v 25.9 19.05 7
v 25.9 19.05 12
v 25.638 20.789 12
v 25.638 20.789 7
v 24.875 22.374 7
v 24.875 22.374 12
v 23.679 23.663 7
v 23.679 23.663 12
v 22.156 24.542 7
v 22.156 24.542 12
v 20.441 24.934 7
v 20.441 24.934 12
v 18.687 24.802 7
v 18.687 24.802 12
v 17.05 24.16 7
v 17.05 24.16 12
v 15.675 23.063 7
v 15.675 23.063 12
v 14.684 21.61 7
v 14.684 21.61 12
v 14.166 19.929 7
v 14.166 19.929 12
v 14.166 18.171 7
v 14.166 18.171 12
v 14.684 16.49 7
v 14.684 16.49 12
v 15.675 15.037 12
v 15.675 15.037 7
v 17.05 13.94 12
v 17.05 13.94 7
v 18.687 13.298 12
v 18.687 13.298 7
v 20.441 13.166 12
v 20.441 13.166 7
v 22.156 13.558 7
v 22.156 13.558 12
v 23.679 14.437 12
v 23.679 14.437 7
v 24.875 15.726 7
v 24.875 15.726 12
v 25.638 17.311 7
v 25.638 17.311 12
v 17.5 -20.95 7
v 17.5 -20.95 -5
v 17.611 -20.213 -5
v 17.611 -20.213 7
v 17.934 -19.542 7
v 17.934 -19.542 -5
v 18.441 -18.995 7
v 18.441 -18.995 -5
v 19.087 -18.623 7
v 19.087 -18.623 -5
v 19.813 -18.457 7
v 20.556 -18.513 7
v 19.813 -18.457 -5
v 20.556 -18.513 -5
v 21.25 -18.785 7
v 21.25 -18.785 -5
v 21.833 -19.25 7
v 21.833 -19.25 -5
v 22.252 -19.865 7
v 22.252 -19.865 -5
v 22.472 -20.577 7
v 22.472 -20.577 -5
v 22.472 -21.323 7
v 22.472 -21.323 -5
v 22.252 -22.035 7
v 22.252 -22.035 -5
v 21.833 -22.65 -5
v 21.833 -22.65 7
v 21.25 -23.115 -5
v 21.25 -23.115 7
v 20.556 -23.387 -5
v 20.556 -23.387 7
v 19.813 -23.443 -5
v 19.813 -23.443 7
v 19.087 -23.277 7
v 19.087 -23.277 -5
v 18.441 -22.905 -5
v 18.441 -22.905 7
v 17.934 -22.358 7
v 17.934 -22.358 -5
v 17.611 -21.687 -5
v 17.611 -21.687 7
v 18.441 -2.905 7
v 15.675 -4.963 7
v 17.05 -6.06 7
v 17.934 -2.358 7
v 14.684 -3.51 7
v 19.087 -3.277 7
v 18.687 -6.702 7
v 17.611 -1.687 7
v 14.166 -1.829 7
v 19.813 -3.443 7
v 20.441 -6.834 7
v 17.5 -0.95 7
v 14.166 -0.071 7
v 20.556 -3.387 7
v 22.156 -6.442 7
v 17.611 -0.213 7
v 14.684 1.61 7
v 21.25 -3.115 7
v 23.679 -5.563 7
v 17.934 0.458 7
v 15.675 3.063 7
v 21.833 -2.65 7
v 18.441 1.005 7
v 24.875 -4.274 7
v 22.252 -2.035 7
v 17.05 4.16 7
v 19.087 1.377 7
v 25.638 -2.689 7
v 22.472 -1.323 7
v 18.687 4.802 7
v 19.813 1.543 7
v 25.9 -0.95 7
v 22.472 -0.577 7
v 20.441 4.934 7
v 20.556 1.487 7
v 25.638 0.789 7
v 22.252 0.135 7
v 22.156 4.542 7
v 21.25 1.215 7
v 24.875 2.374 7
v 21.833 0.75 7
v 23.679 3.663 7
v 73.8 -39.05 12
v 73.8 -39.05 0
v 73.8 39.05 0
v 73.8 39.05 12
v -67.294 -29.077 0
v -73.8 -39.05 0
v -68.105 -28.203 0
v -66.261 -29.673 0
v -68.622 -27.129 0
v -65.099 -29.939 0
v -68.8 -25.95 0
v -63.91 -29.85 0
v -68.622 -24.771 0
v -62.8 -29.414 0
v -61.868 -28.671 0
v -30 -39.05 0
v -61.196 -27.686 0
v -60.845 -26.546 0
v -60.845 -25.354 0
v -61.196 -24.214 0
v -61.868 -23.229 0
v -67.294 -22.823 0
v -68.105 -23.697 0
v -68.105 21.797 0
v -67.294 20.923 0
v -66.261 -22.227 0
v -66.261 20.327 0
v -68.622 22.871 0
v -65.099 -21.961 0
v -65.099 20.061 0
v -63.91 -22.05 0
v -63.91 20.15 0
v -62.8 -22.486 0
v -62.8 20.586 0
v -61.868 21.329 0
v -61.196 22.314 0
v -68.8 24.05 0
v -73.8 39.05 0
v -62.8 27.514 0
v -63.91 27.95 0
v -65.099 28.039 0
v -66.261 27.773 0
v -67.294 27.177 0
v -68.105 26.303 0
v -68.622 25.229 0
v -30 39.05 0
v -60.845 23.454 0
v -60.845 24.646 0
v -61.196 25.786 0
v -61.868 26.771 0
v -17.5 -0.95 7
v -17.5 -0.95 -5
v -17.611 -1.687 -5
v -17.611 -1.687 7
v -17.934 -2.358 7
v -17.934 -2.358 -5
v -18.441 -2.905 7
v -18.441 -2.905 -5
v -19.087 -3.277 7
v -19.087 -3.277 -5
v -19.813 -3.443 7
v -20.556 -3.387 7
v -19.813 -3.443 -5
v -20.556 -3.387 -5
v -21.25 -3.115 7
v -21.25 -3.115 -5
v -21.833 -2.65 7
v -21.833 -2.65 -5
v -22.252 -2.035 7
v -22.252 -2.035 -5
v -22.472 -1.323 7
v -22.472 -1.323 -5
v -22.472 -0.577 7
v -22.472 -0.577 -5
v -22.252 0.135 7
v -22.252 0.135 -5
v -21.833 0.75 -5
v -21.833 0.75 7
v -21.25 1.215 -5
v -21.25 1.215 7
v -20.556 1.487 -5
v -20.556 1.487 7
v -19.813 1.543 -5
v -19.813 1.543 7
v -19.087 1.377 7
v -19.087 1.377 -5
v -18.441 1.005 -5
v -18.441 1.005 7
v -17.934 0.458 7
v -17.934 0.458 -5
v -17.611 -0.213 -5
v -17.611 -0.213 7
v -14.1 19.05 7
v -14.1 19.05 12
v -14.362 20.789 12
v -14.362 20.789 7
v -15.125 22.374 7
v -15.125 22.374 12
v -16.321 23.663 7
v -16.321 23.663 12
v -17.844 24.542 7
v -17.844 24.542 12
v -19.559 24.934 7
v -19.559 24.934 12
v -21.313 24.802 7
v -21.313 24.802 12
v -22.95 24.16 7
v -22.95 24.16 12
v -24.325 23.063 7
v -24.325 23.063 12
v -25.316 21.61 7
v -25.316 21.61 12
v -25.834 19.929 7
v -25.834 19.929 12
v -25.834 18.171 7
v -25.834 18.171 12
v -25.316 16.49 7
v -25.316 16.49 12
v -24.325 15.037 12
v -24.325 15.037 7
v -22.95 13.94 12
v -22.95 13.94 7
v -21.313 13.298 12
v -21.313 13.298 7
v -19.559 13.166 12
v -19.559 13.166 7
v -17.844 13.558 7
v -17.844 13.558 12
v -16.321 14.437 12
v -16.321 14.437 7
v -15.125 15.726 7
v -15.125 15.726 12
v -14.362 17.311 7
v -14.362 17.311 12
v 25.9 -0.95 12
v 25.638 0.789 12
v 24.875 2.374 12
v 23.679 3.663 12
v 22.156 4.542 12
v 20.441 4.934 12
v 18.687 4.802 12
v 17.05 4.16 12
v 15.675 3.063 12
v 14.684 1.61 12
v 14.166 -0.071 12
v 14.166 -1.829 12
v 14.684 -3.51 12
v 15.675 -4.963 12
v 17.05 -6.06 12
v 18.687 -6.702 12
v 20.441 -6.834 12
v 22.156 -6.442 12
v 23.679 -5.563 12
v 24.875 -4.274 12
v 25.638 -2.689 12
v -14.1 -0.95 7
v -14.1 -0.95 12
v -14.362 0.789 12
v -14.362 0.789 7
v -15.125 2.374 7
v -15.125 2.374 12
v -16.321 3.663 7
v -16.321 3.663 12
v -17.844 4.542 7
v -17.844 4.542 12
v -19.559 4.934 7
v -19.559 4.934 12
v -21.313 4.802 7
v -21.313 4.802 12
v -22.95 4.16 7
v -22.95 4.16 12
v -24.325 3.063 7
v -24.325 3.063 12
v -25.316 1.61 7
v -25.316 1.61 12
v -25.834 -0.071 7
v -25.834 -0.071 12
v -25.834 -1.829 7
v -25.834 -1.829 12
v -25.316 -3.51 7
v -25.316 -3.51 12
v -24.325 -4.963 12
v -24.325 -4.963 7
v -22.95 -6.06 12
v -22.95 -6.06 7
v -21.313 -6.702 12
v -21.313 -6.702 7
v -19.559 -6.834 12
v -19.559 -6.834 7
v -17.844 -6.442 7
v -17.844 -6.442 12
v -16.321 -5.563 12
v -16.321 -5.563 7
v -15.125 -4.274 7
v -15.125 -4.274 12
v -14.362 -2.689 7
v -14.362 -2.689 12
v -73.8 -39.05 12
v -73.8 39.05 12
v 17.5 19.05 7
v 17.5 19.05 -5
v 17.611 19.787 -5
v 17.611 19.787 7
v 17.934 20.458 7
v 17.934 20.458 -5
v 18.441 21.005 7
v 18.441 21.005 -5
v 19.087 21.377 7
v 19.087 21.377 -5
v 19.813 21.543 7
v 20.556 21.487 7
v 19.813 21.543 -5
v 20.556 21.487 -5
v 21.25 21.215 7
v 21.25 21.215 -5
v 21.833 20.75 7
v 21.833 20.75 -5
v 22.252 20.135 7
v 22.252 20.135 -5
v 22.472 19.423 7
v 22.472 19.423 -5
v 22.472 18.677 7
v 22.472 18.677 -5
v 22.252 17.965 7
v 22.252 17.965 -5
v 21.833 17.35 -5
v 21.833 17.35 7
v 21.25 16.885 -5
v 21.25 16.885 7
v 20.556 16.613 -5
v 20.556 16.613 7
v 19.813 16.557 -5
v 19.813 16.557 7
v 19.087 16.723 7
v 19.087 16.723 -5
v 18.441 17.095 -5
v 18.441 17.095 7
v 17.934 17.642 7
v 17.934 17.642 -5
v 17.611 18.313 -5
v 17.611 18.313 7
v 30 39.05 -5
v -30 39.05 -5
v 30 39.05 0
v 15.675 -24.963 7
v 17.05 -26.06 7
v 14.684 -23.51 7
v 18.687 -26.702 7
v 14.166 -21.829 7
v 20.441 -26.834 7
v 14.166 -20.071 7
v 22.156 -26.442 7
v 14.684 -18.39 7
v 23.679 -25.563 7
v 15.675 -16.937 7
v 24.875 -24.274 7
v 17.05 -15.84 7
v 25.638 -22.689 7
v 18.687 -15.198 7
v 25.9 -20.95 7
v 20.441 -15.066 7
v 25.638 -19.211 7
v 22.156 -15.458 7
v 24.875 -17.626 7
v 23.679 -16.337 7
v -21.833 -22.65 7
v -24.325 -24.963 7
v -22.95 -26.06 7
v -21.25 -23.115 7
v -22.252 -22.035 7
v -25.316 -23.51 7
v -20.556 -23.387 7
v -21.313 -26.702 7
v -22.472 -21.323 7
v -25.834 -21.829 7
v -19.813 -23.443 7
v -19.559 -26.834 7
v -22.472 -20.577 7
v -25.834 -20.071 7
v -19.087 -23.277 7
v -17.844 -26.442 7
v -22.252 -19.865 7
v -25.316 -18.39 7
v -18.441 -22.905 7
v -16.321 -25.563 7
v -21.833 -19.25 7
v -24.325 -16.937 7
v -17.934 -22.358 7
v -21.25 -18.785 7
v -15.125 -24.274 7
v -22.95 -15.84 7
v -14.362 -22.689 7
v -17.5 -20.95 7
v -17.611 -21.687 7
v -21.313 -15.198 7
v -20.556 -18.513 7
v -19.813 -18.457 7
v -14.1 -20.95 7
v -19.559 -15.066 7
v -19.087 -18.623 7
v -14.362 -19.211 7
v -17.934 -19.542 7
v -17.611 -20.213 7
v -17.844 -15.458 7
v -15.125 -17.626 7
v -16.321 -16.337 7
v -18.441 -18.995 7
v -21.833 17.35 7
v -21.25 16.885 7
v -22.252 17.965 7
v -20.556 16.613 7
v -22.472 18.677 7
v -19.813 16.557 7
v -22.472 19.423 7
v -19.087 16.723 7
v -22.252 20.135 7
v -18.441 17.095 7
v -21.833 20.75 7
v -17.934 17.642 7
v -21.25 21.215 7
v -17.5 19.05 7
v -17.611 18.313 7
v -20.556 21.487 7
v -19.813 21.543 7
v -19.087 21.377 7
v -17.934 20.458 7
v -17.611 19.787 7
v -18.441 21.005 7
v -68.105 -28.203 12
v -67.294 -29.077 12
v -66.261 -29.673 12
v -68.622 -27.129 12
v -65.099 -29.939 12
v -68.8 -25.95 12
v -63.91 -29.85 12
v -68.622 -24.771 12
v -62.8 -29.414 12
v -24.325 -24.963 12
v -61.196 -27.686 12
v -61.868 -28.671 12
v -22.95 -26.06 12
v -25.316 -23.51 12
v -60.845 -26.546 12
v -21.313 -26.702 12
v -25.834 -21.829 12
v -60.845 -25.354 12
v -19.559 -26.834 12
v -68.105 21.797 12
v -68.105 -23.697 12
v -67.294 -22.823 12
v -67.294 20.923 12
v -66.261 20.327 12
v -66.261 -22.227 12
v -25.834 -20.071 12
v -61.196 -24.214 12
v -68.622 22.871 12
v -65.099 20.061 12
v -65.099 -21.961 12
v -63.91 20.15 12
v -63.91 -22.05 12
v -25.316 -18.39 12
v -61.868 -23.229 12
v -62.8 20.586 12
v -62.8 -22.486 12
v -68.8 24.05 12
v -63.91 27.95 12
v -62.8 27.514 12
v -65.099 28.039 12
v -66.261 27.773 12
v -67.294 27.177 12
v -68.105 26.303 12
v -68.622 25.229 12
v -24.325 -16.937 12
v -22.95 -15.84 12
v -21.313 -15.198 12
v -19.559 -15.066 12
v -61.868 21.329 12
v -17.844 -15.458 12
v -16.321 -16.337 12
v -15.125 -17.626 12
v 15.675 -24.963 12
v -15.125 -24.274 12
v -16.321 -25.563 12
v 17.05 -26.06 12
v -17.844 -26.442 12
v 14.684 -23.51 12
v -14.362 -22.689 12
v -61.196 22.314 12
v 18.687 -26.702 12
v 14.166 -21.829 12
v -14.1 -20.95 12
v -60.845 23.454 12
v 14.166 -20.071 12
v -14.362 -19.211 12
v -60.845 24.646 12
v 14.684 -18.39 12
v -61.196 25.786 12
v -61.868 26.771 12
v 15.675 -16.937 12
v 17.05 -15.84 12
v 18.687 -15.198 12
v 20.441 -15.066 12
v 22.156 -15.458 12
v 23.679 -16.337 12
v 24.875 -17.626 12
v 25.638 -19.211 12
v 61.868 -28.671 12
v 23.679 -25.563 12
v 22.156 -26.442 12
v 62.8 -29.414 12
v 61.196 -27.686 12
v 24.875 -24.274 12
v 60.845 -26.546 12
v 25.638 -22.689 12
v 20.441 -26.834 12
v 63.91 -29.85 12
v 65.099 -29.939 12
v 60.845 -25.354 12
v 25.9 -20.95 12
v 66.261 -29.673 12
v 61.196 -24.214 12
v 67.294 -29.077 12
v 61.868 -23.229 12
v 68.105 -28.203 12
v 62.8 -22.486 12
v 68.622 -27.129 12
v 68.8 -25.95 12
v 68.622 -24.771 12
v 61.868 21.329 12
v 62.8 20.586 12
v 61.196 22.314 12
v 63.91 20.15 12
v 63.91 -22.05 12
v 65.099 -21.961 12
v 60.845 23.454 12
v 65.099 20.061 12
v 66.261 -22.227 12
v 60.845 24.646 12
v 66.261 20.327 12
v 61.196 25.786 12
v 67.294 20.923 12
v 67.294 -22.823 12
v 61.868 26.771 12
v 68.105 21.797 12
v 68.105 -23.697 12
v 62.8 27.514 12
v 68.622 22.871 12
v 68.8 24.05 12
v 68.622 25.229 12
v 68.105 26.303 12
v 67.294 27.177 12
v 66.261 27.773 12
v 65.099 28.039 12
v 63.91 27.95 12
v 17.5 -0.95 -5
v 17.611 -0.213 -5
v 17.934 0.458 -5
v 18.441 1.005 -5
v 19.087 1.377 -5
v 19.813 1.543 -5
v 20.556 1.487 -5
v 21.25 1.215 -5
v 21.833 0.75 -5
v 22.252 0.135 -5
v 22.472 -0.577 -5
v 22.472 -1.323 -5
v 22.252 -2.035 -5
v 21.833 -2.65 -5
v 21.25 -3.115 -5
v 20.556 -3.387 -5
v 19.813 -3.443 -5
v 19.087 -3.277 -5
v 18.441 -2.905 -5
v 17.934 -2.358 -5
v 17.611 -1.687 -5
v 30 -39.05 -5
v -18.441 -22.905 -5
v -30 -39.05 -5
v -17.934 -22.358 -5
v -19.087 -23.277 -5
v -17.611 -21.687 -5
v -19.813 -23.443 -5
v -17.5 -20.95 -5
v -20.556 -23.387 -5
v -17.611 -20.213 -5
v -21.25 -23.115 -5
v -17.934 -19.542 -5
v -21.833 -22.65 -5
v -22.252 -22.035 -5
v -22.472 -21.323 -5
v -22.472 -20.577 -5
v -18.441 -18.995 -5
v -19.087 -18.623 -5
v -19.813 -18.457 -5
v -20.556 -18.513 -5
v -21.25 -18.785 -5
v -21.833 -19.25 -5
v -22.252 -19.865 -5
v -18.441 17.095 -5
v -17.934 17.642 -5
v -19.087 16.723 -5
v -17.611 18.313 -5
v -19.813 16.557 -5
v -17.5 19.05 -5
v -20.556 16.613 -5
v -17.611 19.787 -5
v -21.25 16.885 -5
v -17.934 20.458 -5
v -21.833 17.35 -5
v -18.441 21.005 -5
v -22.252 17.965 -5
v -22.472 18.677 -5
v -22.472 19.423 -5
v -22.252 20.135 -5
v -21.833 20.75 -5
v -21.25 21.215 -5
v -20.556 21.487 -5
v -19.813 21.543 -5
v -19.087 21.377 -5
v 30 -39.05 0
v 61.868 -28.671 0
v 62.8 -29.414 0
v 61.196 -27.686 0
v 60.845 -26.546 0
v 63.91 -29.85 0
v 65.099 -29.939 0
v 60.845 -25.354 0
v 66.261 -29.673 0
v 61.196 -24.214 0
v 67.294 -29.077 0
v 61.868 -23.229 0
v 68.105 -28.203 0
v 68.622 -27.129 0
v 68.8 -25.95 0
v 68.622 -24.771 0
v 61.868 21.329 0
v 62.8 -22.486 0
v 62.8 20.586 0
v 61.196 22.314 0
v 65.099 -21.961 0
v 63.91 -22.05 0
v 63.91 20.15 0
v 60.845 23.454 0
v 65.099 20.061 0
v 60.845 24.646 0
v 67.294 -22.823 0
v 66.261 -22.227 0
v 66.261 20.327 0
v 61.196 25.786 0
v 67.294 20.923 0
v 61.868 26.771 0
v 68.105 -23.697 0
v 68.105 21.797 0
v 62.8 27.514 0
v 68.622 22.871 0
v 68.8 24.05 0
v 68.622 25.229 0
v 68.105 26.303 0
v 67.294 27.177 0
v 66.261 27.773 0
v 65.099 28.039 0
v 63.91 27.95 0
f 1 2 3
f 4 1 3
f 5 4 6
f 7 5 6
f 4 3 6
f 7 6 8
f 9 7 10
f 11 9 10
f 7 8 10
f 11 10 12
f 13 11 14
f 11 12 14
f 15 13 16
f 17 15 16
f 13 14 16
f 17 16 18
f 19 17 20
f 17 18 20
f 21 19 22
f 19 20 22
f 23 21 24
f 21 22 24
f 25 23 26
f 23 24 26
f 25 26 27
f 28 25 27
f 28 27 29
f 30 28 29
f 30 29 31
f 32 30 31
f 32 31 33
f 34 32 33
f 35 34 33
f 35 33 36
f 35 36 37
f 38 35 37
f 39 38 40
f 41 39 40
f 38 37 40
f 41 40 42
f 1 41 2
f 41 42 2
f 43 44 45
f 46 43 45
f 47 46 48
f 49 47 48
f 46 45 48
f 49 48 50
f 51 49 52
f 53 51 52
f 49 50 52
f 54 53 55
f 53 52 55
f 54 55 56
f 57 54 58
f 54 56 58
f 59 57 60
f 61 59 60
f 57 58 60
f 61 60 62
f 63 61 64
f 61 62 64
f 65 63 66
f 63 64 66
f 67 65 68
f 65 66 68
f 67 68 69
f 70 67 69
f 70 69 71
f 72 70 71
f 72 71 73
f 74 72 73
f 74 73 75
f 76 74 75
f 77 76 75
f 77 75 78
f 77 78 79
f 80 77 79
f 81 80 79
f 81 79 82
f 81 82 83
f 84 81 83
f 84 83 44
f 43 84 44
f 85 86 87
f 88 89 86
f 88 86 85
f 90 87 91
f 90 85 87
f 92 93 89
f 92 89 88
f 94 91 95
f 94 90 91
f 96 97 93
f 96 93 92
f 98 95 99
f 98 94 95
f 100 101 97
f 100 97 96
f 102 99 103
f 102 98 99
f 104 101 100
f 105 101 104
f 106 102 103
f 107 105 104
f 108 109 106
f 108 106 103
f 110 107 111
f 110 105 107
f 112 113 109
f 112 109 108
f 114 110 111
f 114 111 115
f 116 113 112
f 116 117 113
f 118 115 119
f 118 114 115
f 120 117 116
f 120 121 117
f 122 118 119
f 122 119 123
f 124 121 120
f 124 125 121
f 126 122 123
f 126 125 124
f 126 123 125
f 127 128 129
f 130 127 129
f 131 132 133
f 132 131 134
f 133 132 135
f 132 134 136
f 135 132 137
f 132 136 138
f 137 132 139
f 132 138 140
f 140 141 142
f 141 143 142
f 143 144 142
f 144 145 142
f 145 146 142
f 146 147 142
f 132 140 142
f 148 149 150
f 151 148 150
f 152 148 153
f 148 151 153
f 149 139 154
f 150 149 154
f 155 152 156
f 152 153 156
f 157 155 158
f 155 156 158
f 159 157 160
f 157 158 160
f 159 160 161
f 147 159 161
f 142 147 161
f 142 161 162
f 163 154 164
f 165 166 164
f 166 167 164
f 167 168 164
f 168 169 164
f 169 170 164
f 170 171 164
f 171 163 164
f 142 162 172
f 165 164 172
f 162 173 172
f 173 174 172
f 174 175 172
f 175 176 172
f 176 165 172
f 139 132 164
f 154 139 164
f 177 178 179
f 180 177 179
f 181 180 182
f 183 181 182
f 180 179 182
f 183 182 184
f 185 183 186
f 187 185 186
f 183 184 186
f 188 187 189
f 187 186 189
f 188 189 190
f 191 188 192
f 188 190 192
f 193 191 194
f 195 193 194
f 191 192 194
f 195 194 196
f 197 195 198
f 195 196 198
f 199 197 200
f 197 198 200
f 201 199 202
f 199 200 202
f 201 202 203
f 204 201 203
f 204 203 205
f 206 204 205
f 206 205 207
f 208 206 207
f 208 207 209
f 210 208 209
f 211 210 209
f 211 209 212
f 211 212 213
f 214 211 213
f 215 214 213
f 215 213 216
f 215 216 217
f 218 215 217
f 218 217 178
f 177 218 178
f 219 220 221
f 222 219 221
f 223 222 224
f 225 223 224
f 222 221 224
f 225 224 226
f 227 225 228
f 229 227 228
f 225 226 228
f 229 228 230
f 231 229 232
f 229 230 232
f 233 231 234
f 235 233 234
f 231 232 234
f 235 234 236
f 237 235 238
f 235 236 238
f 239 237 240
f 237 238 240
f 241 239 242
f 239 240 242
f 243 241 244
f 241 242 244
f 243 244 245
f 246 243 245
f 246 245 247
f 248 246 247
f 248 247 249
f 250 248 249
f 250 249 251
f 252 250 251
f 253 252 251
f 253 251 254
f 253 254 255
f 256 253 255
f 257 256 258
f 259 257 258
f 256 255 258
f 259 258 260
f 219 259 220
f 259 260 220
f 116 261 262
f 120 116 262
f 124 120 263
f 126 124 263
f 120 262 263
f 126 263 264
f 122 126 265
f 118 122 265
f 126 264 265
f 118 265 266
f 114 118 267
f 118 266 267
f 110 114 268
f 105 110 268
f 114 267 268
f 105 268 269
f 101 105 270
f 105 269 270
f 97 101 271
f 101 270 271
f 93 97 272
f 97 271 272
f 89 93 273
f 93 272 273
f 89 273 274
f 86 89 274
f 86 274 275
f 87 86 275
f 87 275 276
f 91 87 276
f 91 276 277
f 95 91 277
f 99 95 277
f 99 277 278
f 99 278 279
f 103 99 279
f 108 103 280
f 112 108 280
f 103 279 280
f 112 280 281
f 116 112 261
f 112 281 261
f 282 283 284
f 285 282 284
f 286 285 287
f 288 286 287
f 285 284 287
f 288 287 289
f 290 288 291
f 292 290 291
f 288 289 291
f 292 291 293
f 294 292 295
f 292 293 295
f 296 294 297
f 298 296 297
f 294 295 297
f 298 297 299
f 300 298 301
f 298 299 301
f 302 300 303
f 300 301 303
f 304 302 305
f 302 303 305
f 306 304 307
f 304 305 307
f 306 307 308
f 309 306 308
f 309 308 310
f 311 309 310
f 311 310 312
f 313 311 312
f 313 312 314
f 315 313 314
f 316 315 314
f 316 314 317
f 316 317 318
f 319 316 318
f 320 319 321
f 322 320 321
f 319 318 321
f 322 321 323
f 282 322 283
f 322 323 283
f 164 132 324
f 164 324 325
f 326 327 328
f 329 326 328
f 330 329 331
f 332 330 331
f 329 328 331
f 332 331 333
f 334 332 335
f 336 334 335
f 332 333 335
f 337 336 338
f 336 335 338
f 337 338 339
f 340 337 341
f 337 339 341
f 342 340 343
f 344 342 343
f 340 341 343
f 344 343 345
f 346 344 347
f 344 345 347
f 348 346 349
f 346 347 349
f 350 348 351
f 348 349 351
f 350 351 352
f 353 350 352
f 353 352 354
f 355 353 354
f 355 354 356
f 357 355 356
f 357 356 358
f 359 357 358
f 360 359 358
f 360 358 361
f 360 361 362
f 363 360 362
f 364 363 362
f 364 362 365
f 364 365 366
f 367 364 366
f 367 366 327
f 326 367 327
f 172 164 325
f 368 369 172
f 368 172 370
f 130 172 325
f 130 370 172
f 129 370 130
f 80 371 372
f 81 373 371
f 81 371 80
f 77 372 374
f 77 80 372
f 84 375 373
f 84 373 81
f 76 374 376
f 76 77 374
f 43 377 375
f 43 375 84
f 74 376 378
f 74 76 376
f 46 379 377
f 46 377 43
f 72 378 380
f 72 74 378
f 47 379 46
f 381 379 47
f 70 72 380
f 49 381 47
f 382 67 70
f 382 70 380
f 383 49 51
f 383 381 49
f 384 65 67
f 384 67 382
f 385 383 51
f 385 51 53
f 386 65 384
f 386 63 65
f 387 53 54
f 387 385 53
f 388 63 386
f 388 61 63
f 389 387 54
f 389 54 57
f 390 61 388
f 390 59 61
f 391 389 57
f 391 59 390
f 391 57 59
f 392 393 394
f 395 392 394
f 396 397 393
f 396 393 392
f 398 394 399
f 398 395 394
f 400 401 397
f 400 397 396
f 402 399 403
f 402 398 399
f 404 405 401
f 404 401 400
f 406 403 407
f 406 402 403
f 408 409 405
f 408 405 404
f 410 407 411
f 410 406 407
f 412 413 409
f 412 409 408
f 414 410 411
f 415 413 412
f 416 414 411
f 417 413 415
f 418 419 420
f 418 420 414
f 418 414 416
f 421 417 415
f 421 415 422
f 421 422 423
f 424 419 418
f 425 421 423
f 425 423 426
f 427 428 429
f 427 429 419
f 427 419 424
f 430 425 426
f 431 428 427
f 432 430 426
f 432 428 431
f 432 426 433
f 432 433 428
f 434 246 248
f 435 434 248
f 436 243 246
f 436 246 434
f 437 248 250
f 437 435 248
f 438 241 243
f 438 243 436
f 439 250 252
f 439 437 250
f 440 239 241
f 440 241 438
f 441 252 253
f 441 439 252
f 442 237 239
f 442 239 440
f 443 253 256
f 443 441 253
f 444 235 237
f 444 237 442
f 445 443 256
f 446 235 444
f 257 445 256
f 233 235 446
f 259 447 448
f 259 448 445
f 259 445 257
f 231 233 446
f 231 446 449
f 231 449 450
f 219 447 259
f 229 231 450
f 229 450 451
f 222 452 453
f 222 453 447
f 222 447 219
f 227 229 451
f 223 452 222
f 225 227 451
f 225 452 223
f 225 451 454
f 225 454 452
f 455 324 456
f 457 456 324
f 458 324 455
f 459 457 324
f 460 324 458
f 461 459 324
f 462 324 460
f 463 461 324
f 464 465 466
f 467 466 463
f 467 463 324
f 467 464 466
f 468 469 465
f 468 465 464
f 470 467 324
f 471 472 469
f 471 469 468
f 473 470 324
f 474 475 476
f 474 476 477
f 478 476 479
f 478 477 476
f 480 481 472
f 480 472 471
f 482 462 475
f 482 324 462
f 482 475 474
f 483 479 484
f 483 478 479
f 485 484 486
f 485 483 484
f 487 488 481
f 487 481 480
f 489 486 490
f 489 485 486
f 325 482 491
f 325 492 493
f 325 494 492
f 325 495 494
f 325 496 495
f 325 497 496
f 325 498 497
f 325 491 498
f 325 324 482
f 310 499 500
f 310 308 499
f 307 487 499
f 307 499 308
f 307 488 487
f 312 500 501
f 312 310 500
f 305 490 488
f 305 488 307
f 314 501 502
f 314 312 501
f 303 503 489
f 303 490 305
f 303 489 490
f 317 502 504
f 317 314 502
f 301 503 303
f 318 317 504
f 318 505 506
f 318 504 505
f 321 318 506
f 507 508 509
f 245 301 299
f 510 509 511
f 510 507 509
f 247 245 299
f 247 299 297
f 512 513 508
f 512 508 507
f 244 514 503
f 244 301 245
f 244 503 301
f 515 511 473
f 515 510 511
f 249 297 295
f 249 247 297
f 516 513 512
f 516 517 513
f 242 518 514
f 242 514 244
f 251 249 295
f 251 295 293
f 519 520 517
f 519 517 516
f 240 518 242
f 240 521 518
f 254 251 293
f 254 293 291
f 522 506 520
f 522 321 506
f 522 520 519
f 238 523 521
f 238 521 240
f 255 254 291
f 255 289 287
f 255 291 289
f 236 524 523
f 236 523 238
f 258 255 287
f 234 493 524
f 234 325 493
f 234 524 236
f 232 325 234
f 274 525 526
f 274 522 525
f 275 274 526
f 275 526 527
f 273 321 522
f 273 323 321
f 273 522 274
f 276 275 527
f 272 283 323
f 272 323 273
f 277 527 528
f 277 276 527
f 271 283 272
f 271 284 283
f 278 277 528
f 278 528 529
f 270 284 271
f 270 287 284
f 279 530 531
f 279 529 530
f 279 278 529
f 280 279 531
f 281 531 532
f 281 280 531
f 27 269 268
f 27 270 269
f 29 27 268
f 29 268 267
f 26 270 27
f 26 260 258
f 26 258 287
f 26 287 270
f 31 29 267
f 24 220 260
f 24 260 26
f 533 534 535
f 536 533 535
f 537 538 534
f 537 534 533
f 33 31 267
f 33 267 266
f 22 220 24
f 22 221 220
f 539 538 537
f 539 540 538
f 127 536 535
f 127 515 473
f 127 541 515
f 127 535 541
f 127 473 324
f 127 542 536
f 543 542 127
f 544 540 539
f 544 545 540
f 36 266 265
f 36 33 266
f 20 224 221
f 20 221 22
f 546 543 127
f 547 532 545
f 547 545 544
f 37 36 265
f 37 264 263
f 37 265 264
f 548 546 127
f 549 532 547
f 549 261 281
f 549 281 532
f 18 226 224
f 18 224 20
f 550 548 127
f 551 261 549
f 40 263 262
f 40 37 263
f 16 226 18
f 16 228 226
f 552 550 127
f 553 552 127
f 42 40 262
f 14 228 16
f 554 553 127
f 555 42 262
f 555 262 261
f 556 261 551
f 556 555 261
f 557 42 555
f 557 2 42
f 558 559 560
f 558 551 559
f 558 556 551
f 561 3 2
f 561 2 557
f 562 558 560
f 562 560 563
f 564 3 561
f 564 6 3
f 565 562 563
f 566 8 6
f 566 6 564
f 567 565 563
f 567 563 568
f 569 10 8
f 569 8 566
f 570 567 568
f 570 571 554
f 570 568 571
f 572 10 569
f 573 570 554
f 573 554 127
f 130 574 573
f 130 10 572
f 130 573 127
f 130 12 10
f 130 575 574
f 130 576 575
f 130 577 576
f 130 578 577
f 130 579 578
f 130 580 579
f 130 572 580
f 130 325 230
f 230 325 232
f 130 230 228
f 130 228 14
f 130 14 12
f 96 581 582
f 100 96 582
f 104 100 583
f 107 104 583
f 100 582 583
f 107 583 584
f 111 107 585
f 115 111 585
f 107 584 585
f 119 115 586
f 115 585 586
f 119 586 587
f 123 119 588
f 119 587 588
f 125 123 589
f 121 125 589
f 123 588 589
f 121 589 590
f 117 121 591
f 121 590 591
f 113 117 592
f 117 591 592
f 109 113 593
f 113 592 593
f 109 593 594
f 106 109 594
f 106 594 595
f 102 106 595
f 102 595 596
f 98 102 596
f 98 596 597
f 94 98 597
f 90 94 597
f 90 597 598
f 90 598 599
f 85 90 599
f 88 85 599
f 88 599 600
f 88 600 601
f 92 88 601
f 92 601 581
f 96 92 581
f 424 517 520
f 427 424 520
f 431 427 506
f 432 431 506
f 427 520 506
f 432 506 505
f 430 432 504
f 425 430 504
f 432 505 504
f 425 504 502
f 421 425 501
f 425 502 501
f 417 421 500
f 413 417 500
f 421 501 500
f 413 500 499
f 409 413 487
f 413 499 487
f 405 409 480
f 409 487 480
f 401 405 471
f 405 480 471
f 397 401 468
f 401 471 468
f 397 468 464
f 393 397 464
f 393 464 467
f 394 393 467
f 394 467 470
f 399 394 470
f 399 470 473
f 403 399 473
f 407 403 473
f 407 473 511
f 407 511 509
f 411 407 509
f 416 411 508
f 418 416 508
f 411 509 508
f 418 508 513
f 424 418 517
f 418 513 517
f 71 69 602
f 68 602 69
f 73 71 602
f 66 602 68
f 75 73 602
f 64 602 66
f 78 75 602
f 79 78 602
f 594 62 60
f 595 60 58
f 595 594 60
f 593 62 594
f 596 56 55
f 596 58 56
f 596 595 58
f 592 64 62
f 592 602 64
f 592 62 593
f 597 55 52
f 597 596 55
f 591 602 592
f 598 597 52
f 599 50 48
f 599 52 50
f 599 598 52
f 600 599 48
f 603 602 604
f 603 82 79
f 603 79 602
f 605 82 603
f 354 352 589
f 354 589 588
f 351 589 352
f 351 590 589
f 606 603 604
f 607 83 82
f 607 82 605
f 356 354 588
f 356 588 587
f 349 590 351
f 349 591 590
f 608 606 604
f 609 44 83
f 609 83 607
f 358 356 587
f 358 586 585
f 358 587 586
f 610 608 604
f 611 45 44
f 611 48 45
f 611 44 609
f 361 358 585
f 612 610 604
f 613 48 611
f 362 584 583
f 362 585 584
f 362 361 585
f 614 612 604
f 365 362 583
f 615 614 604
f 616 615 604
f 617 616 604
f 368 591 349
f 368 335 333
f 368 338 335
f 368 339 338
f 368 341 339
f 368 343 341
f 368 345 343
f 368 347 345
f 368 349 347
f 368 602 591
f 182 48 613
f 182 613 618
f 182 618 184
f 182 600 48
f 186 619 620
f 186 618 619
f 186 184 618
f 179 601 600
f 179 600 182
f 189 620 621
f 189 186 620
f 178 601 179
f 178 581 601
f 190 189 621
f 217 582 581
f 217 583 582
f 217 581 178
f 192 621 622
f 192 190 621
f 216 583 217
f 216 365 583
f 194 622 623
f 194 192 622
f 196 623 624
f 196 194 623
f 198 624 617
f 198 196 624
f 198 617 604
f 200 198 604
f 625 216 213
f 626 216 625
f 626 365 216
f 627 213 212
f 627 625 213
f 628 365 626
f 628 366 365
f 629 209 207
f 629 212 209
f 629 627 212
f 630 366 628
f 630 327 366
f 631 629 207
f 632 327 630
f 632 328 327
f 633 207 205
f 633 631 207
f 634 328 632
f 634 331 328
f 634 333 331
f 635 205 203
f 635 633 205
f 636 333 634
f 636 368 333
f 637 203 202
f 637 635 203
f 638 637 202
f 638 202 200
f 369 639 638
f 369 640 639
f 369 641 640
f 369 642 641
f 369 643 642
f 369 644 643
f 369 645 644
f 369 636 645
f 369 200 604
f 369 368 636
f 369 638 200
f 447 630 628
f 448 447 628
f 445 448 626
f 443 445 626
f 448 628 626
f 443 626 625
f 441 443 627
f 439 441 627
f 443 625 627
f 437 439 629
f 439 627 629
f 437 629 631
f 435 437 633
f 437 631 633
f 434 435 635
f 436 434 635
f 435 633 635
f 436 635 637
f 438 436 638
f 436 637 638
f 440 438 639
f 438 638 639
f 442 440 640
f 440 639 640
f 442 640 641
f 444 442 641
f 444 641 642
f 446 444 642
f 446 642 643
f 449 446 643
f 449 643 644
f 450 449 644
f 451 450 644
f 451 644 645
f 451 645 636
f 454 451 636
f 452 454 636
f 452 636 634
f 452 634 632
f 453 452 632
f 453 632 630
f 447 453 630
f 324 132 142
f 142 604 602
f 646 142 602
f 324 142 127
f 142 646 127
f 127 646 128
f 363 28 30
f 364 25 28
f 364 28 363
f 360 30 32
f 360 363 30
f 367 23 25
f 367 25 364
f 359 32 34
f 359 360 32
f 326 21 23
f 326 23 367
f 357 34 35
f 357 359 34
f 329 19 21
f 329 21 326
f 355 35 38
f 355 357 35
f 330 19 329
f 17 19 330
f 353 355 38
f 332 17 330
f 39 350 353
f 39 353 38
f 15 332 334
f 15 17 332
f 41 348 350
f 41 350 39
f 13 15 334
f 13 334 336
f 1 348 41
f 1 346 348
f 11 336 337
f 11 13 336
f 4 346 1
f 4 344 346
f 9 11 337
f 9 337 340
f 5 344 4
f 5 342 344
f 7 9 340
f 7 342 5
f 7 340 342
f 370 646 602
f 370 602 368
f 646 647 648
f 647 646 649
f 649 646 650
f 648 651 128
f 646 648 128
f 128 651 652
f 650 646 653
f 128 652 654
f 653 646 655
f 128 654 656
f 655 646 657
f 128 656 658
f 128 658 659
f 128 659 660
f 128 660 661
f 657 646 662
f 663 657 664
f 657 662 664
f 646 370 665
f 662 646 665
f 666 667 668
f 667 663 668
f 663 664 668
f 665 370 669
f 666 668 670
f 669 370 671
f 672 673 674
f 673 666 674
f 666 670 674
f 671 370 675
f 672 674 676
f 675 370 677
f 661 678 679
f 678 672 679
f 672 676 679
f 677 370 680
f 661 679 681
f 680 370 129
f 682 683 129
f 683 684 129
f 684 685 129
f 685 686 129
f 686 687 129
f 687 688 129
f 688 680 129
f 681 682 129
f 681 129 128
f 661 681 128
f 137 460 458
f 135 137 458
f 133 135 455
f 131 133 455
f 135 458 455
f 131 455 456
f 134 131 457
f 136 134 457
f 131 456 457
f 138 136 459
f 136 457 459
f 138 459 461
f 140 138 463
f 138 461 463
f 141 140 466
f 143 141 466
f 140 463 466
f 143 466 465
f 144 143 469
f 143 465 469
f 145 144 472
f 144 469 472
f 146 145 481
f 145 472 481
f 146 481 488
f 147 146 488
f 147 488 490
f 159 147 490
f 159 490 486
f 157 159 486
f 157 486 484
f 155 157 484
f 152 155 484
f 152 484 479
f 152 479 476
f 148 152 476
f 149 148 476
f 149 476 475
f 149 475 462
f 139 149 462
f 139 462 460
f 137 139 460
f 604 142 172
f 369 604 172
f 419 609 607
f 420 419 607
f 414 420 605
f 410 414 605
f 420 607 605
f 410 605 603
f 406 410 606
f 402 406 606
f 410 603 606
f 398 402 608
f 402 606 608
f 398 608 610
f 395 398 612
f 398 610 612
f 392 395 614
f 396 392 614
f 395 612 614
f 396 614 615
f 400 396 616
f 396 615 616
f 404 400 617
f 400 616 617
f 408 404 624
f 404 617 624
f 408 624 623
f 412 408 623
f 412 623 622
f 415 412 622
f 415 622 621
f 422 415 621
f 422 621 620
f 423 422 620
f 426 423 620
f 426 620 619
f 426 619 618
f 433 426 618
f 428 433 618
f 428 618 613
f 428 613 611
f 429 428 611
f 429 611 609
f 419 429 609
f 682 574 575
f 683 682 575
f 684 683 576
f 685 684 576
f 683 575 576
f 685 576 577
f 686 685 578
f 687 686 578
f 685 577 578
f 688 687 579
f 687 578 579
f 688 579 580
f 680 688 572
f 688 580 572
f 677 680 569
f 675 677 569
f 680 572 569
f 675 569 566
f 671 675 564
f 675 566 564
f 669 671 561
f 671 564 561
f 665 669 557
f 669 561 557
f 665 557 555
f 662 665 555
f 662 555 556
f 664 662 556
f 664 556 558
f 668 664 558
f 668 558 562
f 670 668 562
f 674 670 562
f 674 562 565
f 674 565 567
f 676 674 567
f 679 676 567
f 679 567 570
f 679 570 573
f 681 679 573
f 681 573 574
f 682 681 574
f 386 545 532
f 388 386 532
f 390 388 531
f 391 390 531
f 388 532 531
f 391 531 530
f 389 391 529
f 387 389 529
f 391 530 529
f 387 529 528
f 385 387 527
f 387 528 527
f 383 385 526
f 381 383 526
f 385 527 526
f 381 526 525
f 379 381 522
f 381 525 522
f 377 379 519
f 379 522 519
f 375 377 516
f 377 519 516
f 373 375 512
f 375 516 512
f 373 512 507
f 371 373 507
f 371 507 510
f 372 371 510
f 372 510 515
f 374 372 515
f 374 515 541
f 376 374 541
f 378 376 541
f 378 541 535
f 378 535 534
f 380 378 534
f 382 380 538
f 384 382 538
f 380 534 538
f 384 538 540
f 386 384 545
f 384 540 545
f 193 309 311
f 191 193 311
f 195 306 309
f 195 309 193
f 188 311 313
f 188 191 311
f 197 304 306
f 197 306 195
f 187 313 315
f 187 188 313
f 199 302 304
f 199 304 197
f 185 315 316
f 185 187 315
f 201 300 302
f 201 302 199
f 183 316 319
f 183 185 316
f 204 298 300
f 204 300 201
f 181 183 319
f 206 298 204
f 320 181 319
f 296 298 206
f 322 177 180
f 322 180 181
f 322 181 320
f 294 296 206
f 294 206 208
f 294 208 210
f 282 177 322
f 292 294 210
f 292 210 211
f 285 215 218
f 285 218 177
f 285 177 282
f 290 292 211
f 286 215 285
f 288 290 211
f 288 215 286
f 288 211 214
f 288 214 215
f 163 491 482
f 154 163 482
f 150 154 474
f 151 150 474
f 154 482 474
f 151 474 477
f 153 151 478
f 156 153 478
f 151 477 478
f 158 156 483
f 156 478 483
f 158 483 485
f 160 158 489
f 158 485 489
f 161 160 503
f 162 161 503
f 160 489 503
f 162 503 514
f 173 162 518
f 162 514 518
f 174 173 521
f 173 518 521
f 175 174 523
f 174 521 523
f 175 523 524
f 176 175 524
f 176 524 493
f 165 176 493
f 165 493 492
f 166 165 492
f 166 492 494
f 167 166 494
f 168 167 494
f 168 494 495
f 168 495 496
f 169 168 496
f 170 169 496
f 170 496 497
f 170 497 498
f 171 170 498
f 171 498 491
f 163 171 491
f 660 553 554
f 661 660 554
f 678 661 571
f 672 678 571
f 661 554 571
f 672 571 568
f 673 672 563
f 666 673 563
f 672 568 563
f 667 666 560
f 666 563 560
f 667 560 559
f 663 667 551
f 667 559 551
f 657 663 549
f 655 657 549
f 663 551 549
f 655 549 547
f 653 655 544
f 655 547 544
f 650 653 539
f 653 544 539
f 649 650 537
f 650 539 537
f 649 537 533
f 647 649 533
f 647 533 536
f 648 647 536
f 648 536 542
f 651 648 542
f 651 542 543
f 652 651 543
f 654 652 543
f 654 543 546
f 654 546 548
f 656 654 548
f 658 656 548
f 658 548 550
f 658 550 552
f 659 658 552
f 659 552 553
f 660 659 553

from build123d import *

# Parameters (mm, degrees)
SKETCH1_W           = 147.6
SKETCH1_H           = 78.1
BOSS_EXTRUDE1_DEPTH = 12
SKETCH2_W           = 60
SKETCH2_H           = 78.1
BOSS_EXTRUDE2_DEPTH = 5
SKETCH3_R           = 2.5
CUT_EXTRUDE1_DEPTH  = 86.207643436
SKETCH4_R           = 4
CUT_EXTRUDE2_DEPTH  = 86.207643436
SKETCH5_R           = 5.9
CUT_EXTRUDE3_DEPTH  = 5


with BuildPart() as part:
    # Sketch1 → Boss-Extrude1 (new body)
    with BuildSketch(Plane.XY):
        Rectangle(SKETCH1_W, SKETCH1_H)
    extrude(amount=BOSS_EXTRUDE1_DEPTH)

    # Sketch2 → Boss-Extrude2 (add)
    with BuildSketch(Plane(origin=(0, 0, 0), x_dir=(-1, 0, 0), z_dir=(0, 0, -1))):
        Rectangle(SKETCH2_W, SKETCH2_H)
    extrude(amount=BOSS_EXTRUDE2_DEPTH)

    # Sketch3 → Cut-Extrude1 (cut, through all)
    with BuildSketch(Plane(origin=(0, 0, -5), x_dir=(-1, 0, 0), z_dir=(0, 0, -1))):
        with Locations((-20, 19.05)):
            Circle(SKETCH3_R)
        with Locations((-20, -0.95)):
            Circle(SKETCH3_R)
        with Locations((-20, -20.95)):
            Circle(SKETCH3_R)
        with Locations(Location((20, -20.95, 0), (0, 0, 180))):
            Circle(SKETCH3_R)
        with Locations(Location((20, -0.95, 0), (0, 0, 180))):
            Circle(SKETCH3_R)
        with Locations(Location((20, 19.05, 0), (0, 0, 180))):
            Circle(SKETCH3_R)
    extrude(amount=-CUT_EXTRUDE1_DEPTH, mode=Mode.SUBTRACT)

    # Sketch4 → Cut-Extrude2 (cut, through all)
    with BuildSketch(Plane.XY.offset(12)):
        with Locations((64.8, 24.05)):
            Circle(SKETCH4_R)
        with Locations((64.8, -25.95)):
            Circle(SKETCH4_R)
        with Locations(Location((-64.8, -25.95, 0), (0, 0, 180))):
            Circle(SKETCH4_R)
        with Locations(Location((-64.8, 24.05, 0), (0, 0, 180))):
            Circle(SKETCH4_R)
    extrude(amount=-CUT_EXTRUDE2_DEPTH, mode=Mode.SUBTRACT)

    # Sketch5 → Cut-Extrude3 (cut)
    with BuildSketch(Plane.XY.offset(12)):
        with Locations((-20, 19.05)):
            Circle(SKETCH5_R)
        with Locations((20, 19.05)):
            Circle(SKETCH5_R)
        with Locations((-20, -0.95)):
            Circle(SKETCH5_R)
        with Locations((20, -0.95)):
            Circle(SKETCH5_R)
        with Locations((-20, -20.95)):
            Circle(SKETCH5_R)
        with Locations((20, -20.95)):
            Circle(SKETCH5_R)
    extrude(amount=-CUT_EXTRUDE3_DEPTH, mode=Mode.SUBTRACT)


solid = part.part
